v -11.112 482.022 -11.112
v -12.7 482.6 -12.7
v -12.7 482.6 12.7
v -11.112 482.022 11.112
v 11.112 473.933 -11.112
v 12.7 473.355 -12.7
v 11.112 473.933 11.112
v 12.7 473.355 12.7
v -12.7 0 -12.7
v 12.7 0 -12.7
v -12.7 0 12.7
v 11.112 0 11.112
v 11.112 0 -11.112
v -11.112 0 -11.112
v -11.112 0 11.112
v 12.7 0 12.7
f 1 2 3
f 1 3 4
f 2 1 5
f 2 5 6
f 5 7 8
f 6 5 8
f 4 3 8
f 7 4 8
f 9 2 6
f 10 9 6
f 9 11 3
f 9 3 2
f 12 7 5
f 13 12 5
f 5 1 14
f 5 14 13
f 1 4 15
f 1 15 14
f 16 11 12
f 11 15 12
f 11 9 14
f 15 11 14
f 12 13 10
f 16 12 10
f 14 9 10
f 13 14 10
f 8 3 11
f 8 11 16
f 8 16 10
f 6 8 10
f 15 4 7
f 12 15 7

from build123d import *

# Parameters (mm, degrees)
SKETCH1_W           = 25.4
SKETCH1_H           = 25.4
SKETCH1_W_2         = 22.225
SKETCH1_H_2         = 22.225
BOSS_EXTRUDE1_DEPTH = 482.6
CUT_EXTRUDE1_DEPTH  = 25.4


with BuildPart() as part:
    # Sketch1 → Boss-Extrude1 (new body)
    with BuildSketch(Plane(origin=(0, 0, 0), x_dir=(1, 0, 0), z_dir=(0, 1, 0))):
        Rectangle(SKETCH1_W, SKETCH1_H)
        Rectangle(SKETCH1_W_2, SKETCH1_H_2, mode=Mode.SUBTRACT)
    extrude(amount=BOSS_EXTRUDE1_DEPTH)

    # Sketch2 → Cut-Extrude1 (cut)
    with BuildSketch(Plane.XY.offset(12.7)):
        Polygon((-12.7, 482.6), (12.7, 473.35515605), (12.7, 482.6), align=None)
    extrude(amount=-CUT_EXTRUDE1_DEPTH, mode=Mode.SUBTRACT)


solid = part.part
